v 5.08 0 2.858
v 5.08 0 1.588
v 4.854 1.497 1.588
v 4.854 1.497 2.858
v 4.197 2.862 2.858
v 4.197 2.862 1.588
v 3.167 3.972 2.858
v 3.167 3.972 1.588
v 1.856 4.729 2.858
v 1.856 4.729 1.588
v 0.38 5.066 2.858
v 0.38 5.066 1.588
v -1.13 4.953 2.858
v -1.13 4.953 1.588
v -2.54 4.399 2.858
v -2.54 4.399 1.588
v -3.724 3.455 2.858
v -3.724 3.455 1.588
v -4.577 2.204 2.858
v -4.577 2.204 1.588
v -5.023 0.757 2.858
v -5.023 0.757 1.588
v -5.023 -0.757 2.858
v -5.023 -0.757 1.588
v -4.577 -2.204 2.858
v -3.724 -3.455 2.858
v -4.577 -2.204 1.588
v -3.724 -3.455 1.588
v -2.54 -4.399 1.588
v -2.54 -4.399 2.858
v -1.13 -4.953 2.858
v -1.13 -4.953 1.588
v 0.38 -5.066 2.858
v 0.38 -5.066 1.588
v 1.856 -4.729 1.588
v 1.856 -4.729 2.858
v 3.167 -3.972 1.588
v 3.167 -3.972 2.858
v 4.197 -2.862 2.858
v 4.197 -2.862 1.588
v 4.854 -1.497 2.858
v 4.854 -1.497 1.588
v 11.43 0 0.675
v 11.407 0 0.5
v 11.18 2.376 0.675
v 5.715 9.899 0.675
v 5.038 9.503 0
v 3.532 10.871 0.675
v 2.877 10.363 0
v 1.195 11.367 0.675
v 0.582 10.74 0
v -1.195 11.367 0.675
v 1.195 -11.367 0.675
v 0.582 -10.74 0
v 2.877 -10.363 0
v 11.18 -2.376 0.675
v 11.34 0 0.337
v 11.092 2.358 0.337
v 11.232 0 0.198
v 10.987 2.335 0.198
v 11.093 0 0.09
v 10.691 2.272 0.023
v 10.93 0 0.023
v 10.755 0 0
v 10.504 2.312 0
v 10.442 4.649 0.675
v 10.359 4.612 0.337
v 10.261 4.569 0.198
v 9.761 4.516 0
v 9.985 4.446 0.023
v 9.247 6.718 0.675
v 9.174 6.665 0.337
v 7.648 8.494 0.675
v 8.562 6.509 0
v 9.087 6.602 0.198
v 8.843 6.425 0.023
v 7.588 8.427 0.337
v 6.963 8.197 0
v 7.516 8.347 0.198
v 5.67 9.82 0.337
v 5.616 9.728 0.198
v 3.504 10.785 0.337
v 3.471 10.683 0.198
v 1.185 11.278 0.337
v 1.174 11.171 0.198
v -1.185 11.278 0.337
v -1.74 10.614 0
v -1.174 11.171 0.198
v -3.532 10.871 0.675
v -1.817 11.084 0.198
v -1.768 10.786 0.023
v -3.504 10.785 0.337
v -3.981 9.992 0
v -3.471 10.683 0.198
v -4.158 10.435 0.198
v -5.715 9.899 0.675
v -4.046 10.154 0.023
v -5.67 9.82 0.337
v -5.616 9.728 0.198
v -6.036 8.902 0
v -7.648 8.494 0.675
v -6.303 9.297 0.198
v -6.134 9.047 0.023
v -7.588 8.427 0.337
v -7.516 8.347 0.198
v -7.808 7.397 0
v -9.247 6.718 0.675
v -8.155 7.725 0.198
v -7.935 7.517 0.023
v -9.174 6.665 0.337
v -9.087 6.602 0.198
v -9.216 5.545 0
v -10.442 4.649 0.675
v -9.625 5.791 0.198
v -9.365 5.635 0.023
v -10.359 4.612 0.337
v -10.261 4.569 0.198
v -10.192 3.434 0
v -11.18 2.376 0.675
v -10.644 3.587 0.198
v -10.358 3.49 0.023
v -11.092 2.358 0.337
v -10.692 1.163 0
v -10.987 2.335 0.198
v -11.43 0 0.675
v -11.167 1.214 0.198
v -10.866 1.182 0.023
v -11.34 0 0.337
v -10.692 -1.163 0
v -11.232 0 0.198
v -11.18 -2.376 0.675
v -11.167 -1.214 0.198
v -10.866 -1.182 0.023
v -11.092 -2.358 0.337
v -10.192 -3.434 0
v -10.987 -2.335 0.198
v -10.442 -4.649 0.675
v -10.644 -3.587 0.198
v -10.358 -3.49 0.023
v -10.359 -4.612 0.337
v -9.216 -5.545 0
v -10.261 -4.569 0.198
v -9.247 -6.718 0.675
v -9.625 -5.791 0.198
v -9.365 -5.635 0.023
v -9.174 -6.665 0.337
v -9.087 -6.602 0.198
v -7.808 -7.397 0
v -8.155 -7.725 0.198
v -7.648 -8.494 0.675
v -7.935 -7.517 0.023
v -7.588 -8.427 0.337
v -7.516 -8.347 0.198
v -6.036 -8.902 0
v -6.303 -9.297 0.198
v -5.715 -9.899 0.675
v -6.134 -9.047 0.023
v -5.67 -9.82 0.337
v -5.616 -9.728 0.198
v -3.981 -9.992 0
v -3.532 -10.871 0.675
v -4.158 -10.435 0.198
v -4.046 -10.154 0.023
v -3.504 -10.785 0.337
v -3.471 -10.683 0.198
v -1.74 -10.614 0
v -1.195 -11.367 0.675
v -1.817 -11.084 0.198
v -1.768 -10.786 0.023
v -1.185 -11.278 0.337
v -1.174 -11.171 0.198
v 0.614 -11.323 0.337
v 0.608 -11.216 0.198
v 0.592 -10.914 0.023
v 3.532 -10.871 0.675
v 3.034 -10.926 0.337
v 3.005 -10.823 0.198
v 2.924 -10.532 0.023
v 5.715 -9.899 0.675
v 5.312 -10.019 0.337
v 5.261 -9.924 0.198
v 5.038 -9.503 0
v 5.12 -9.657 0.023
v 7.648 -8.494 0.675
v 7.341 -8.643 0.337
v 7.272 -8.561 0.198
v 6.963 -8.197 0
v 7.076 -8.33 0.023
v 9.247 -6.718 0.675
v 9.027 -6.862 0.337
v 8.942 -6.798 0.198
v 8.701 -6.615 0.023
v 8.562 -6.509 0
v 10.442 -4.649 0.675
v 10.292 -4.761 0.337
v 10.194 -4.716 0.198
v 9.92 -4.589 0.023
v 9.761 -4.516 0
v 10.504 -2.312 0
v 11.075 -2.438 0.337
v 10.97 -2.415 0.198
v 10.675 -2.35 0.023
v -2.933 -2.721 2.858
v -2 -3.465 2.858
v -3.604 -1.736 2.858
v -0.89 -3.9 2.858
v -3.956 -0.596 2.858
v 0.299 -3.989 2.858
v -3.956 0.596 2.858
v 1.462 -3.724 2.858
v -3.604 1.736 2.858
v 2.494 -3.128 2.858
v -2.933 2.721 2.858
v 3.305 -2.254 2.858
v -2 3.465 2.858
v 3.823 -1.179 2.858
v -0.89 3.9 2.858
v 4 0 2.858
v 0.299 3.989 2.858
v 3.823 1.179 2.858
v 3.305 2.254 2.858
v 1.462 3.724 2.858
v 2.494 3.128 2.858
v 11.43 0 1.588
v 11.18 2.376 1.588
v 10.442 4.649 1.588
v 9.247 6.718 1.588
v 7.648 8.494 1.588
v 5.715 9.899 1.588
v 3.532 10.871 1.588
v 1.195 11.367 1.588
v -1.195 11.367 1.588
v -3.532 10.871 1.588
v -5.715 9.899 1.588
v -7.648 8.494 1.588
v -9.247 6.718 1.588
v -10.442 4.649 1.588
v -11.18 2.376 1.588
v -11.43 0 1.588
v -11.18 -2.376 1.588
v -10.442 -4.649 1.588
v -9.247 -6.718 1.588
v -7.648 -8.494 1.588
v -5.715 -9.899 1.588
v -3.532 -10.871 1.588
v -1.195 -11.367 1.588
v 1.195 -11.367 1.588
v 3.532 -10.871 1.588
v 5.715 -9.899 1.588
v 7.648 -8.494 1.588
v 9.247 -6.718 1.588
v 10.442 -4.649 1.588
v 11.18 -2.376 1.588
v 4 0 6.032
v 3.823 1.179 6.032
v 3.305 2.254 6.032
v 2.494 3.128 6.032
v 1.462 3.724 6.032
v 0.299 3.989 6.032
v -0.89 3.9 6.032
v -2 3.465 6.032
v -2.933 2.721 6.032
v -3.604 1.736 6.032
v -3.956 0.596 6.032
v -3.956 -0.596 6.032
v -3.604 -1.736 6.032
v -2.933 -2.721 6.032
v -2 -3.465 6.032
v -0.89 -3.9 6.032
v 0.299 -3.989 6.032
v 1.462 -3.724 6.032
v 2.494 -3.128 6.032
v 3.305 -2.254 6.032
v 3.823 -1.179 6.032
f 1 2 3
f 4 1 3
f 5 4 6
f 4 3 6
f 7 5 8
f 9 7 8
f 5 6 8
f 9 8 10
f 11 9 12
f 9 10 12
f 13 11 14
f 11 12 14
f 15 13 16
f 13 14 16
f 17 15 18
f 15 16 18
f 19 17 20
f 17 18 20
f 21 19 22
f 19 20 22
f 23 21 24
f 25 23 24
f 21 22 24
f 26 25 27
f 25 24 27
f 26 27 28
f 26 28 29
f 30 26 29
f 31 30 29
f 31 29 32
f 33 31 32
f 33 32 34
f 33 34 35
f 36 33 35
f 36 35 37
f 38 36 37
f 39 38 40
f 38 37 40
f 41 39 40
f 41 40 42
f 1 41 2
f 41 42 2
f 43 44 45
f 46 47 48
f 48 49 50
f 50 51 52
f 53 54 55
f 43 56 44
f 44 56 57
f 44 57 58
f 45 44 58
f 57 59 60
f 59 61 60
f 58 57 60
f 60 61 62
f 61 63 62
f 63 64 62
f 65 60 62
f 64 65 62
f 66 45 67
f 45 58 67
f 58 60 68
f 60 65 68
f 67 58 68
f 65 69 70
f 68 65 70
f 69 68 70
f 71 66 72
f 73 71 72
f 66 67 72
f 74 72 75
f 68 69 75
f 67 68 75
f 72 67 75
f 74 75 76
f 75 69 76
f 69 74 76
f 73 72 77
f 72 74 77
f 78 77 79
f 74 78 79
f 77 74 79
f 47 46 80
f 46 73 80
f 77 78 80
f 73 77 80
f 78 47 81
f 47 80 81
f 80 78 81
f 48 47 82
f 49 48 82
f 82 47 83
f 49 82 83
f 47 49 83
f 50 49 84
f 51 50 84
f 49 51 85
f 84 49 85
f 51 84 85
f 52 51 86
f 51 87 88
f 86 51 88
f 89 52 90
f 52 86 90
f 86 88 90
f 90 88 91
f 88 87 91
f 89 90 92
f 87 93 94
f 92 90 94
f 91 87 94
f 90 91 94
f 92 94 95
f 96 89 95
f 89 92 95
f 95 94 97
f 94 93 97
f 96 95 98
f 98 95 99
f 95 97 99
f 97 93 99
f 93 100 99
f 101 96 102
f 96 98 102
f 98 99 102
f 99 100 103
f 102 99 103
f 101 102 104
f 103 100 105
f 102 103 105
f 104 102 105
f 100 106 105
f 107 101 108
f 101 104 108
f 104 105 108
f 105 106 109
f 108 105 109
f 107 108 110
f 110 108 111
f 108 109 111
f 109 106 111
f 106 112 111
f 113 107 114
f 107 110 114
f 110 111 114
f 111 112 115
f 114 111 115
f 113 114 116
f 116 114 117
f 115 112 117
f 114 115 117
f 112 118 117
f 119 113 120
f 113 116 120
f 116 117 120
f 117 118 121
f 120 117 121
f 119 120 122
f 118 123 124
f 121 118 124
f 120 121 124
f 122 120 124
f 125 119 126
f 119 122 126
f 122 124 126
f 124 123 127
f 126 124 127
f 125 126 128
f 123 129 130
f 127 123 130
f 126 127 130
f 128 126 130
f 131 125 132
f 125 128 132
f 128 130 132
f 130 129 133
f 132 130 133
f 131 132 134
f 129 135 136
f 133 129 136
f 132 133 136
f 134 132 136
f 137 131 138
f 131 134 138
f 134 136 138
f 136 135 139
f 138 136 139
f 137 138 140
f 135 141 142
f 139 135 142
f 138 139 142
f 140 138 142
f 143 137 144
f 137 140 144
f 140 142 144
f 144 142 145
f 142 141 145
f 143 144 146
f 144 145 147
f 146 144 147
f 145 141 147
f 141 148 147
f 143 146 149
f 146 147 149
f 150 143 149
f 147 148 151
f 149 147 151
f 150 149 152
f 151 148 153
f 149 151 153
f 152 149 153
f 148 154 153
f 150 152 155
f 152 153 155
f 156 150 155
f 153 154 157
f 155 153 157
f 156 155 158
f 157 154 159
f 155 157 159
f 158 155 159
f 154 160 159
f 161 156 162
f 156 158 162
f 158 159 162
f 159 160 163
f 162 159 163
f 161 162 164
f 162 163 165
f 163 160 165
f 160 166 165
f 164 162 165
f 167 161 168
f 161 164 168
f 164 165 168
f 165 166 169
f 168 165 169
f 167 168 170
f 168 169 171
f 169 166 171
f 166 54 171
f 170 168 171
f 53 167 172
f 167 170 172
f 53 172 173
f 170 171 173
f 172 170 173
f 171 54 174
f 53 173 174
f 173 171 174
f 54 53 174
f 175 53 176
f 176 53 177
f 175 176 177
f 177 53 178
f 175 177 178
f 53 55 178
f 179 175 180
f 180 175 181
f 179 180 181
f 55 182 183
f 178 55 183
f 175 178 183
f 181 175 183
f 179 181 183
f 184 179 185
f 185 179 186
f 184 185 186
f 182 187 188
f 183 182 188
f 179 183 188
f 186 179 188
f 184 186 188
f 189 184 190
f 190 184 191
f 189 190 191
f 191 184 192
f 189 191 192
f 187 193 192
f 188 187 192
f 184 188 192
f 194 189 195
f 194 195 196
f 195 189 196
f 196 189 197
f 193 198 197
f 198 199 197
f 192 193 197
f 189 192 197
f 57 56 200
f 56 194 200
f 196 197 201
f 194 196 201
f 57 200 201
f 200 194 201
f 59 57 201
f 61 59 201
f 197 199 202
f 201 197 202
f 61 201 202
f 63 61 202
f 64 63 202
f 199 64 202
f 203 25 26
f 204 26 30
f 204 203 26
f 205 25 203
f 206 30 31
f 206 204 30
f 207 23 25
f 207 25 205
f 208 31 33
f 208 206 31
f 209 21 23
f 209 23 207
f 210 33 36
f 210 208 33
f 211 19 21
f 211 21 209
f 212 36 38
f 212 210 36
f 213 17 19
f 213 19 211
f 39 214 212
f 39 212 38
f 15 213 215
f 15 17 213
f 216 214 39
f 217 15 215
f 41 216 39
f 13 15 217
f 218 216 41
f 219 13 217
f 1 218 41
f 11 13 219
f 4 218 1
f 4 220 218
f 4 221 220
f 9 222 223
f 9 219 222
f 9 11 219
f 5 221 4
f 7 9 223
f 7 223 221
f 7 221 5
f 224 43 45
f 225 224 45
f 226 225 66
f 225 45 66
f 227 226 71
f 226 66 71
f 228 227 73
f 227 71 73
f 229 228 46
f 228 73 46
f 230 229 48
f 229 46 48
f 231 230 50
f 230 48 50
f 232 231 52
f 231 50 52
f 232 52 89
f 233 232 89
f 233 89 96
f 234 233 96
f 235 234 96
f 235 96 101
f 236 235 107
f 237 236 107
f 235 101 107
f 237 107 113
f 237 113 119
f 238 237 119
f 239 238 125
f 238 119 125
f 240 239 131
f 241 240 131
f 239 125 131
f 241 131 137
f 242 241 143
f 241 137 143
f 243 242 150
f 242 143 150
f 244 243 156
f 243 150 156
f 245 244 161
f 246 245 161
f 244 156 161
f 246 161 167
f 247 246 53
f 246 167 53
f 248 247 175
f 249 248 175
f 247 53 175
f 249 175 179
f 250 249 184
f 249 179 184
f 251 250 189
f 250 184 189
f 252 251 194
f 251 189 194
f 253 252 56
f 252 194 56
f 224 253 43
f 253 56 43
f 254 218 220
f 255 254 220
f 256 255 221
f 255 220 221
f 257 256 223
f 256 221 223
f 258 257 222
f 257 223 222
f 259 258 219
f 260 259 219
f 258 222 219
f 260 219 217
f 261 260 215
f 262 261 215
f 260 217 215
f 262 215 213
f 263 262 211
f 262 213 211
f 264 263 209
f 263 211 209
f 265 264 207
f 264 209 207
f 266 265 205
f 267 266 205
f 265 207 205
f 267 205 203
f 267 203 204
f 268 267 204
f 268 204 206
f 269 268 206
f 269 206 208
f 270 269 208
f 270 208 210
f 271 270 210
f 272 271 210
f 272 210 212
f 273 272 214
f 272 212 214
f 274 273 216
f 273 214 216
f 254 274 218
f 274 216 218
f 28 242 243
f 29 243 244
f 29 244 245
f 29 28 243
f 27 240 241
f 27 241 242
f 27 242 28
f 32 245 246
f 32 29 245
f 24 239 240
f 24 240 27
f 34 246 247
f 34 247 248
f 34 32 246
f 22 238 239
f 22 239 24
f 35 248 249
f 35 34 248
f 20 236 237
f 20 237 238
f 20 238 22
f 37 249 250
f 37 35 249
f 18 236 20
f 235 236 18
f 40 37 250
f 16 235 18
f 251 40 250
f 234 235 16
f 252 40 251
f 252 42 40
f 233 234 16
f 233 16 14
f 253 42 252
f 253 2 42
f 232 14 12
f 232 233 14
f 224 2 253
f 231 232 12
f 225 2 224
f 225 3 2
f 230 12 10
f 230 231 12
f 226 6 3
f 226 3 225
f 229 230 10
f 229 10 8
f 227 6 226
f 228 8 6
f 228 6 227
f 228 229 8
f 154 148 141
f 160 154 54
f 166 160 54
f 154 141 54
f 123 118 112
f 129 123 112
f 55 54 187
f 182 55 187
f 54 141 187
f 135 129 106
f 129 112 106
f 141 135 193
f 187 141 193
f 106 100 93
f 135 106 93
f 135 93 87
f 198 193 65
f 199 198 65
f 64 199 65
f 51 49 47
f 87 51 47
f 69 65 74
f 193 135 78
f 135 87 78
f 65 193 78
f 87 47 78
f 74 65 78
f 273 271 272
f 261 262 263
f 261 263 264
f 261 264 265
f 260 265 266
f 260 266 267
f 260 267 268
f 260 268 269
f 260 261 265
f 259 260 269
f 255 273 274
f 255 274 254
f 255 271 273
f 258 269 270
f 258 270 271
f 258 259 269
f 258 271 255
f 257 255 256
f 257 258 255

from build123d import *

# Parameters (mm, degrees)
F0_R     = 11.43
F1_DEPTH = 1.5875
F2_R     = 5.08
F3_DEPTH = 1.27
F4_R     = 4.0005
F5_DEPTH = 3.175
F6_R     = 0.674531


with BuildPart() as f1:
    # F0 (on Top) → F1 (new body)
    with BuildSketch(Plane.XY):
        Circle(F0_R)
    extrude(amount=F1_DEPTH)

    # F2 (on face) → F3 (join)
    with BuildSketch(Plane.XY.offset(1.5875)):
        Circle(F2_R)
    extrude(amount=F3_DEPTH)

    # F4 (on face) → F5 (join)
    with BuildSketch(Plane.XY.offset(2.8575)):
        Circle(F4_R)
    extrude(amount=F5_DEPTH)

    # F6
    f6_edges = [f1.edges().sort_by_distance(p)[0] for p in [
        (-11.43, 0, 0),
    ]]
    fillet(f6_edges, radius=F6_R)


solid = f1.part
